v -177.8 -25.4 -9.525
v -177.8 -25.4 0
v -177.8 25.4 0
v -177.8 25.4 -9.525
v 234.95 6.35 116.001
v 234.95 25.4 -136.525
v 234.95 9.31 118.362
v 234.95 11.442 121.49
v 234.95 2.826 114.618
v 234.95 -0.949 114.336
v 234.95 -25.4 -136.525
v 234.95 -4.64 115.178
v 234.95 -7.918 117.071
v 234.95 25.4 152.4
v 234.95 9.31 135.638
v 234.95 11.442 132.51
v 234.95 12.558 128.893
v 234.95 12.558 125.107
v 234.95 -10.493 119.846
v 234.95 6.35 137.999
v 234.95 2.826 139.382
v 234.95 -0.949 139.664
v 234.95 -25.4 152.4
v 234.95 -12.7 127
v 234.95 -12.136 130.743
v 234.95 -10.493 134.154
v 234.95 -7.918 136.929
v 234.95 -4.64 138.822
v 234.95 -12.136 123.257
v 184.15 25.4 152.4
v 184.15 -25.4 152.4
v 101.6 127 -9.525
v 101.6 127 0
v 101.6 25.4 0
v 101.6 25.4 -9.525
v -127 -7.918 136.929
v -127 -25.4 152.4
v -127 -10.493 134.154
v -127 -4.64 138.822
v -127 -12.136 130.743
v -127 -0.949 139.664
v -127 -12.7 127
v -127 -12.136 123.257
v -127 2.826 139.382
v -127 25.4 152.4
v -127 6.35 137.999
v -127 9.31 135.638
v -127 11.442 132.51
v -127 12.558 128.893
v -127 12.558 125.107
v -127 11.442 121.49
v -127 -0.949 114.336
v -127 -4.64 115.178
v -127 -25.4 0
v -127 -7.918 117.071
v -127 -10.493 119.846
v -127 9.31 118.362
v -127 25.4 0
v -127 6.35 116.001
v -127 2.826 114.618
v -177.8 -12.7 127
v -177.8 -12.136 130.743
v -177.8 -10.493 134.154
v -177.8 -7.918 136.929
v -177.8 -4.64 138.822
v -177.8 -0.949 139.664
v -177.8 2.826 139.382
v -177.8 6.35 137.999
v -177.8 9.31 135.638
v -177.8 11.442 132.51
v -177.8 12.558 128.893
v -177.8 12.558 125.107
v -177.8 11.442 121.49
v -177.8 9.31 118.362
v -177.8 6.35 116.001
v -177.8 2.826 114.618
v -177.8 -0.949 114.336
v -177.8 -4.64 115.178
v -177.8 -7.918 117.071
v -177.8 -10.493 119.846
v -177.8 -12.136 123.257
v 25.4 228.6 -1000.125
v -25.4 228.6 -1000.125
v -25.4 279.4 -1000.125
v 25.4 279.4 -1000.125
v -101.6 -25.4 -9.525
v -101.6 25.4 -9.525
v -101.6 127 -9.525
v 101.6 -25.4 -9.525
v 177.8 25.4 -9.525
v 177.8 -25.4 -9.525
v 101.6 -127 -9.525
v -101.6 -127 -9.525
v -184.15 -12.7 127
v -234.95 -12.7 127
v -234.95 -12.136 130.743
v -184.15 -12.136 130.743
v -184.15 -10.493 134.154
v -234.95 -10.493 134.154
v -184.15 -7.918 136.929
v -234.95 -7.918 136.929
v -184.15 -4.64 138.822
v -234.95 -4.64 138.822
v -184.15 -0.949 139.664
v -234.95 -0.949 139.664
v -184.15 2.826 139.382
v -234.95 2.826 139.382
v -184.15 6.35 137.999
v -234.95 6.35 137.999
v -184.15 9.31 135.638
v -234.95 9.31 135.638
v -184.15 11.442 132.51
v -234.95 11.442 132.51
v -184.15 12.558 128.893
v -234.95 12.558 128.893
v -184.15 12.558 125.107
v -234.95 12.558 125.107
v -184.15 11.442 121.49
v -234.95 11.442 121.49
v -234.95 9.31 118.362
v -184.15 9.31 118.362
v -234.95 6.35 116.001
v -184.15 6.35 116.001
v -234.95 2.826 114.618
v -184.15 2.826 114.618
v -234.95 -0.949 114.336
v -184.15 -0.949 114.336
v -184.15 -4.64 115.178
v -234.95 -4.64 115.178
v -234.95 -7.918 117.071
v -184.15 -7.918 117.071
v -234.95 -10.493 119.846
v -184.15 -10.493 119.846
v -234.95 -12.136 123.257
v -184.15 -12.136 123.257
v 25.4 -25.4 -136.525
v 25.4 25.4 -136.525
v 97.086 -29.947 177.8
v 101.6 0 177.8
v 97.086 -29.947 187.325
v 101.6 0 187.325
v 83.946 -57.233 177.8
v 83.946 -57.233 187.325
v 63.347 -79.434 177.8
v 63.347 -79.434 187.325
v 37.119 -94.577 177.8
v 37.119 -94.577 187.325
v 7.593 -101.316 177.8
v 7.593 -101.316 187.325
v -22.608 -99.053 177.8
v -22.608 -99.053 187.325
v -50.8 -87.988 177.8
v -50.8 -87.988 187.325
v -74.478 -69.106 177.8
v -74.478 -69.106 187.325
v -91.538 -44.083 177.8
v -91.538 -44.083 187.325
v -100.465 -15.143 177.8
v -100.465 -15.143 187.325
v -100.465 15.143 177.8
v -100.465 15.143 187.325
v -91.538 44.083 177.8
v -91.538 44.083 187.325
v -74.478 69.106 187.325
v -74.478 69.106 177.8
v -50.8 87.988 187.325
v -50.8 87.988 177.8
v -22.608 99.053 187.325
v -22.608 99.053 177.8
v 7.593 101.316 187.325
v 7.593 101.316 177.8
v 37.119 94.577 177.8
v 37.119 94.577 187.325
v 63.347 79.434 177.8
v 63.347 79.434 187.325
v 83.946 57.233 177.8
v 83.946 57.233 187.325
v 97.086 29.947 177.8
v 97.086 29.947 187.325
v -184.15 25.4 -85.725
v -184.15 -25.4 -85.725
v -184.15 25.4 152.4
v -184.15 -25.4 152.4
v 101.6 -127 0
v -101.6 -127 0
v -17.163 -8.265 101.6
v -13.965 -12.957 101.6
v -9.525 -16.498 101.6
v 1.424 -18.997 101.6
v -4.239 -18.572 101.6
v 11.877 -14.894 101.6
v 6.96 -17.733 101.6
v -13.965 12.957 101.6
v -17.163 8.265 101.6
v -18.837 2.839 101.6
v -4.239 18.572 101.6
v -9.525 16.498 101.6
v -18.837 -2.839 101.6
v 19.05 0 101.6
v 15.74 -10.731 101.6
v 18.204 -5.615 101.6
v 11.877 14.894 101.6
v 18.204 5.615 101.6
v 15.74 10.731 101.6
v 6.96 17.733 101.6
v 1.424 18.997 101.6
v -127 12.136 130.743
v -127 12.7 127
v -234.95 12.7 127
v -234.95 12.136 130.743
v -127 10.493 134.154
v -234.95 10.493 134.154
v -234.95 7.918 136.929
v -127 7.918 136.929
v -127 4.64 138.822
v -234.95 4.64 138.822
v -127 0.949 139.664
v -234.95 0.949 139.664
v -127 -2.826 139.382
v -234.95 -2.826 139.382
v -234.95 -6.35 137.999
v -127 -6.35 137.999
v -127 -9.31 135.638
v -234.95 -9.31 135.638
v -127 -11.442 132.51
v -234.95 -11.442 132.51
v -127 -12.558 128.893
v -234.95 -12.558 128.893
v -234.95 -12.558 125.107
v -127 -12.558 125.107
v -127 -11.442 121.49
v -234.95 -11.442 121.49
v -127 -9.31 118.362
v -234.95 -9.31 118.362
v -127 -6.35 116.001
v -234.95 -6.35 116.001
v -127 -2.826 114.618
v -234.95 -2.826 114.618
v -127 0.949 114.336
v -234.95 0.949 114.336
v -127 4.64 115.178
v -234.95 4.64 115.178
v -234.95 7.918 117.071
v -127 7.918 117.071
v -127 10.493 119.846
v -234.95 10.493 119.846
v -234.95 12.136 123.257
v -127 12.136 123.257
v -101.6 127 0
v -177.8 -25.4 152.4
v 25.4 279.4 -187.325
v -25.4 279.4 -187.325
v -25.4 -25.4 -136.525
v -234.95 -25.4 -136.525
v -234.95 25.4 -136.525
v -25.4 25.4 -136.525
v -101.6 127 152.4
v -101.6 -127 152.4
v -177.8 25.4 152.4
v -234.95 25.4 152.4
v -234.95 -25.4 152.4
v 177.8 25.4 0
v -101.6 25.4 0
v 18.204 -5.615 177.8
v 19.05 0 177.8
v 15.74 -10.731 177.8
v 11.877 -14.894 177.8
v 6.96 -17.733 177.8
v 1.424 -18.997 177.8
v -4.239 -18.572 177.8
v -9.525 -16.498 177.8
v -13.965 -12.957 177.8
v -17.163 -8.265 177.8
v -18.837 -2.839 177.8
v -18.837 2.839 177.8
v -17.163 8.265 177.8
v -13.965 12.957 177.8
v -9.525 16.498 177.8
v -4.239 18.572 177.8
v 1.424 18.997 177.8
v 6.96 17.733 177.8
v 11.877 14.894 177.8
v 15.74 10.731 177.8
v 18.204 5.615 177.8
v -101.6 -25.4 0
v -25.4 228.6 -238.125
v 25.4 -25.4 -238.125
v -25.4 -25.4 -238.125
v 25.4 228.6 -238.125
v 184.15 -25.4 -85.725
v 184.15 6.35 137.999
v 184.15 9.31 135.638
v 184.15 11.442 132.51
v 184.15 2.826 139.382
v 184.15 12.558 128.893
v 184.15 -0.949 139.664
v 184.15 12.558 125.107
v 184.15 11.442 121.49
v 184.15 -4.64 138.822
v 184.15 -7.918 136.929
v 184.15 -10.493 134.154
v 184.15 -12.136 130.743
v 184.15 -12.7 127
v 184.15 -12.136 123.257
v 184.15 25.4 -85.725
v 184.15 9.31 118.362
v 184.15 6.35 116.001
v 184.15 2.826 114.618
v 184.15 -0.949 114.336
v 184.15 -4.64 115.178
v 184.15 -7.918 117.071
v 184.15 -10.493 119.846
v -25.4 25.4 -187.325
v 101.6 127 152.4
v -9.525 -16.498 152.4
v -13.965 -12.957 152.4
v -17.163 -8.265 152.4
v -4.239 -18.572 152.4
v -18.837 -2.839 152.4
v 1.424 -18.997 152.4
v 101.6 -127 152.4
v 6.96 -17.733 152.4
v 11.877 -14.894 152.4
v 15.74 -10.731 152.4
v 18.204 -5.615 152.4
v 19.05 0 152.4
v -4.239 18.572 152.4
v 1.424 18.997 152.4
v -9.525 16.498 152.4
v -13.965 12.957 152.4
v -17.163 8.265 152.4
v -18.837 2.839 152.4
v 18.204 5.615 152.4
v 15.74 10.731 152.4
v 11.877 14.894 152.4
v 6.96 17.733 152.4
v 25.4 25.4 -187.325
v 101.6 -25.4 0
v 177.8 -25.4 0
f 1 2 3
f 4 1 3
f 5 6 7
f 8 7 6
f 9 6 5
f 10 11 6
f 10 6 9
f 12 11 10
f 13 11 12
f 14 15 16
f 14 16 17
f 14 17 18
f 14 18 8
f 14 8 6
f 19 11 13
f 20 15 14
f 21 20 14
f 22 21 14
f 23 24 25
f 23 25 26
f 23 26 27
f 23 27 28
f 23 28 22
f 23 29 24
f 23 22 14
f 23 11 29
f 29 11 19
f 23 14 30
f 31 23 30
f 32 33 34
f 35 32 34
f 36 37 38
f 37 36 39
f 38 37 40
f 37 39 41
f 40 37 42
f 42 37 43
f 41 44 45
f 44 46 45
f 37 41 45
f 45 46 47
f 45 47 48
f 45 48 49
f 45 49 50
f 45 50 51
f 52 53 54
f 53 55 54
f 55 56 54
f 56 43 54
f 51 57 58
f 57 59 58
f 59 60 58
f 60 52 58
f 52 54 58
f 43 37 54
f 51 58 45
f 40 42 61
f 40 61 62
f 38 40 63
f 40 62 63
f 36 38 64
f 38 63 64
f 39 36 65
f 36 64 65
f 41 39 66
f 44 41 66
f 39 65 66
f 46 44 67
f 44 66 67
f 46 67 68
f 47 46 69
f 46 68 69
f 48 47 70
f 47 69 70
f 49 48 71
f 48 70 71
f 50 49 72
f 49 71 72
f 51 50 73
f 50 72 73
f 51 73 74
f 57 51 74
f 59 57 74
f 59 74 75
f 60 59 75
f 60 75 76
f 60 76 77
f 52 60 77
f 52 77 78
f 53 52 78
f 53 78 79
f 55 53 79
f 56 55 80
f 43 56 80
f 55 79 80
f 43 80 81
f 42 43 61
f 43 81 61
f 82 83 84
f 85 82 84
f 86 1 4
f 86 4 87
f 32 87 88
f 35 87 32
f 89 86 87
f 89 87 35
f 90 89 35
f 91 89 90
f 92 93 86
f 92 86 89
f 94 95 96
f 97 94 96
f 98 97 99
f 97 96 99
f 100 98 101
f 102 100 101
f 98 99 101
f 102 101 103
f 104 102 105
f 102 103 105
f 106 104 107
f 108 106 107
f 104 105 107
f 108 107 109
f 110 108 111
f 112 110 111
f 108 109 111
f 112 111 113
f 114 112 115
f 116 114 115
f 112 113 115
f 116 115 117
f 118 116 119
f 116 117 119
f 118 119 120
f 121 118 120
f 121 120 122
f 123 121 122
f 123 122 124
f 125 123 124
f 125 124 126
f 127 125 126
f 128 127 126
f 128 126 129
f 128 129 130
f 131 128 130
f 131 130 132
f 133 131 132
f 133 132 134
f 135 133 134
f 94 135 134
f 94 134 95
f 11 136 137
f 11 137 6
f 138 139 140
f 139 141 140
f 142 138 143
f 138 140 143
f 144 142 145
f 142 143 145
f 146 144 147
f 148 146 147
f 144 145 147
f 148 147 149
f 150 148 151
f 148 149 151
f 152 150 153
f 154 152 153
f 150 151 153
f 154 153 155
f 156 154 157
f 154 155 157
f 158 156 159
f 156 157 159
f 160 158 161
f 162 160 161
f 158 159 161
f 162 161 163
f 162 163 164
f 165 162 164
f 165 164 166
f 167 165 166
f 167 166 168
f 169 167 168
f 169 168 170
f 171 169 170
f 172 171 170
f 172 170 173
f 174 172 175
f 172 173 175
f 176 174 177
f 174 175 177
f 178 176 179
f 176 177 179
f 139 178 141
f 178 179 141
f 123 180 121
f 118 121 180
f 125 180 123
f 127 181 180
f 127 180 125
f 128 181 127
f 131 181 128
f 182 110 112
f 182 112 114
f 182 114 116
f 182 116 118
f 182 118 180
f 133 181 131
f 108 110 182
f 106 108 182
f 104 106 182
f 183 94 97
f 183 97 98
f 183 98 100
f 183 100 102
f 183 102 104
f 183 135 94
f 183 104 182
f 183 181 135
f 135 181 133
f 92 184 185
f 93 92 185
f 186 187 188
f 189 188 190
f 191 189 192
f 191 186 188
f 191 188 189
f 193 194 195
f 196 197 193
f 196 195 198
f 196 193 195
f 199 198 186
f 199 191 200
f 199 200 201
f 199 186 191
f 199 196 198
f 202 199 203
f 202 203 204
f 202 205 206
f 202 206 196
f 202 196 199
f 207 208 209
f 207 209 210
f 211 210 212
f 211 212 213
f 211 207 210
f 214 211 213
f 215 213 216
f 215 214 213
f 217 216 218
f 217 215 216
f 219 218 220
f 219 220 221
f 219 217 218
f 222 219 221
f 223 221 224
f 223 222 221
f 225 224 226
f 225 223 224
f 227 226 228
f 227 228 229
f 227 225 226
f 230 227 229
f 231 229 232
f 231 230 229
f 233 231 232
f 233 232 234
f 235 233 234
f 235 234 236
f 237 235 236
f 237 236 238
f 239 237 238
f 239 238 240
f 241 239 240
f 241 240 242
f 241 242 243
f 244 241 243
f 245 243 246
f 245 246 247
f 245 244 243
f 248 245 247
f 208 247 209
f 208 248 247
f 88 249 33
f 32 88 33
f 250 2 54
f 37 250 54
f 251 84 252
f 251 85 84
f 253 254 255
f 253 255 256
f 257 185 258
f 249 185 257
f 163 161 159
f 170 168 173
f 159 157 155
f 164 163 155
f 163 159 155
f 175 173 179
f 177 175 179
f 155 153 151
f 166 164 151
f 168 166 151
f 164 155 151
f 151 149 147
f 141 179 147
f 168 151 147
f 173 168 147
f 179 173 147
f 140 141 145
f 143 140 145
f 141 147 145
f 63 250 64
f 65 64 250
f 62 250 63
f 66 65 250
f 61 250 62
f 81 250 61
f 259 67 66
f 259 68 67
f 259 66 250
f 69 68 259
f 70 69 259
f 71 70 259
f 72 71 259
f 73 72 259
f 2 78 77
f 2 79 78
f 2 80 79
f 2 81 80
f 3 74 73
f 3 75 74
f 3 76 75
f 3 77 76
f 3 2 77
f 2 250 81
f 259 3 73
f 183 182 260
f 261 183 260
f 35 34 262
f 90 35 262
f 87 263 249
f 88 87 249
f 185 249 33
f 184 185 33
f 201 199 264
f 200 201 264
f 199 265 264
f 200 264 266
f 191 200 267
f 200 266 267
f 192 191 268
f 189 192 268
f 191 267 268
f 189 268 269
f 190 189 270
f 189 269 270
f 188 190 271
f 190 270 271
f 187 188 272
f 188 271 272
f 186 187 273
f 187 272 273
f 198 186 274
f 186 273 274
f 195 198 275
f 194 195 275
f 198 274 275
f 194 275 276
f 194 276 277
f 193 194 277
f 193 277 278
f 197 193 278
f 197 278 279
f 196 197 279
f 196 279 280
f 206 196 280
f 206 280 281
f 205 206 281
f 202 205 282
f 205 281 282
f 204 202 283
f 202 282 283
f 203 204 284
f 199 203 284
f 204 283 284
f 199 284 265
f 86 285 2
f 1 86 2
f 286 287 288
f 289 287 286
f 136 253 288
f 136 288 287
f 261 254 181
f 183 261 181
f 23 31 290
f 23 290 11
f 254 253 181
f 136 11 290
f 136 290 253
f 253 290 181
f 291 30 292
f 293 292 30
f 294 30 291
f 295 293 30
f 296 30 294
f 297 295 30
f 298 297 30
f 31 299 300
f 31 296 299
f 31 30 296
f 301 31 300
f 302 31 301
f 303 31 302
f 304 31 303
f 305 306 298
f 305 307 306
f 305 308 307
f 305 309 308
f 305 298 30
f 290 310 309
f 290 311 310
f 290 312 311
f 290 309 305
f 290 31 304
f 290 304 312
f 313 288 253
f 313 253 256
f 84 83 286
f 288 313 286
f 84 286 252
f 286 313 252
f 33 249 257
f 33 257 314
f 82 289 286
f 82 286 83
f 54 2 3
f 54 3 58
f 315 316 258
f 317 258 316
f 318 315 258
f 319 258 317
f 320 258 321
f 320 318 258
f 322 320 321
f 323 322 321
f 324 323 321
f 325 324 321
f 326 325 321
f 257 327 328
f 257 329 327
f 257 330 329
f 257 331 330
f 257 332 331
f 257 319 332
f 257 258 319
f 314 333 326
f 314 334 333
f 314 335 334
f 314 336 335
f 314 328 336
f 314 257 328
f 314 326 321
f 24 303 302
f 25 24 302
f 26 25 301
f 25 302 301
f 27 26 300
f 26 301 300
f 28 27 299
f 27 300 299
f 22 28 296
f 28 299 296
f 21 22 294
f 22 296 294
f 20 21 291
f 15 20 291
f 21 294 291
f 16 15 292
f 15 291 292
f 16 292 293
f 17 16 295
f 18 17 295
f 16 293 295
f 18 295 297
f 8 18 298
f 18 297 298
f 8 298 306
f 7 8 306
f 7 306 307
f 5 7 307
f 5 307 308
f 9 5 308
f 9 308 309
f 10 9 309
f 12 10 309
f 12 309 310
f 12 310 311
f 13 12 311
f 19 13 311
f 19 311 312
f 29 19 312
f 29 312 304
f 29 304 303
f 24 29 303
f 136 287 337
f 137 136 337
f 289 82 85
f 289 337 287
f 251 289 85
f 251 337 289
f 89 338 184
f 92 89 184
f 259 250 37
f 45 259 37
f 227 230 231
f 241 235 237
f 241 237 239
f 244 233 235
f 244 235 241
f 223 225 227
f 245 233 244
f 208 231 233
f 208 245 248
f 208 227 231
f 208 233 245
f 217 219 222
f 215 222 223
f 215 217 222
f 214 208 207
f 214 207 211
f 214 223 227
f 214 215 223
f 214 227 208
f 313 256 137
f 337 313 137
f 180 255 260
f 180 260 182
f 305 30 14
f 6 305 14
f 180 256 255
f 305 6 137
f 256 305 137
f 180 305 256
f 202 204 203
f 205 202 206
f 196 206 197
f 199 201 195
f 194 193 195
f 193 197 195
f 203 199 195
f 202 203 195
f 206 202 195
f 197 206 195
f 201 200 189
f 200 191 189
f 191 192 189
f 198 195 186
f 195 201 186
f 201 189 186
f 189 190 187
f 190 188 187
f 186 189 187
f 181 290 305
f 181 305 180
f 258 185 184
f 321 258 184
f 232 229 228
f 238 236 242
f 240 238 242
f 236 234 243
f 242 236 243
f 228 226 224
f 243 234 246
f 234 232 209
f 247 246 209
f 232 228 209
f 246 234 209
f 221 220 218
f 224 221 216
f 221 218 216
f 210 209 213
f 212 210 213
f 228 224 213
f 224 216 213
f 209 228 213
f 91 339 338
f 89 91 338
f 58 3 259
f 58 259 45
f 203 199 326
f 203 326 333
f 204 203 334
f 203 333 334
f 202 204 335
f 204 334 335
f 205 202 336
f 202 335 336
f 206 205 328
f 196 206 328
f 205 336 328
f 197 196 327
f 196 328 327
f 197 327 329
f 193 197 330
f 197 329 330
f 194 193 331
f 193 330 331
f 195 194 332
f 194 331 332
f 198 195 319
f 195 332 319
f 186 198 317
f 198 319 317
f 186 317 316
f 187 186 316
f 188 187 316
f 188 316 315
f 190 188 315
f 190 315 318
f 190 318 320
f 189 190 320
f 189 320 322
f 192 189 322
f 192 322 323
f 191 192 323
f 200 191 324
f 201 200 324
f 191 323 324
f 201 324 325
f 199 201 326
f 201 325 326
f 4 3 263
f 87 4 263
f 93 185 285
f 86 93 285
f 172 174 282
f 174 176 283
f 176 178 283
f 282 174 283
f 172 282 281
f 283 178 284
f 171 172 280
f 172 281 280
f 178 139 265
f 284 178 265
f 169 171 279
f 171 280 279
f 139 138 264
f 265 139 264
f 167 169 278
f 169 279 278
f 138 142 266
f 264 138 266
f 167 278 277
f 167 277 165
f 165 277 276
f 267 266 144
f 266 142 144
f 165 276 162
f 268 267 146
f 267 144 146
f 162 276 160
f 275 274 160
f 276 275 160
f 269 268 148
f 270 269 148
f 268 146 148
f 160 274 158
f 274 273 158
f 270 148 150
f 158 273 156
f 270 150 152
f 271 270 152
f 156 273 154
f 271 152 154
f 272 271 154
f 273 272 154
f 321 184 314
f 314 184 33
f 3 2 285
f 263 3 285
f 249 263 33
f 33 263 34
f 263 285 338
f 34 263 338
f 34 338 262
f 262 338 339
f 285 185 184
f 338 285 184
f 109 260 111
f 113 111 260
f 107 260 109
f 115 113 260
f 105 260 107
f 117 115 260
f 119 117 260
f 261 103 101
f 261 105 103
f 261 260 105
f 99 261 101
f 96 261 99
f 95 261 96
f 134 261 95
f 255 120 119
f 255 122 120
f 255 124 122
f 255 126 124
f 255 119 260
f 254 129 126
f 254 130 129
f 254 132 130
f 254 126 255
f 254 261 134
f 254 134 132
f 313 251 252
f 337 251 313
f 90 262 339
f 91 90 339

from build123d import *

# Parameters (mm, degrees)
F0_W      = 203.2
F0_H      = 254
F1_DEPTH  = 152.4
F2_R      = 19.05
F3_DEPTH  = 50.8
F7_DEPTH  = 9.525
F8_W      = 50.8
F8_H      = 50.8
F9_DEPTH  = 152.4
F10_R     = 12.7
F11_DEPTH = 50.8
F12_R     = 12.7
F13_DEPTH = 107.95
F15_DEPTH = 50.8
F16_R     = 12.7
F17_DEPTH = 469.9
F19_DEPTH = 25.4


with BuildPart() as f1:
    # F0 (on Top) → F1 (new body)
    with BuildSketch(Plane.XY):
        Rectangle(F0_W, F0_H)
    extrude(amount=F1_DEPTH)

    # F2 (on face) → F3 (cut)
    with BuildSketch(Plane.XY.offset(152.4)):
        Circle(F2_R)
    extrude(amount=-F3_DEPTH, mode=Mode.SUBTRACT)


with BuildPart() as f5:
    # F4 (on Front) → F5 (revolve)
    with BuildSketch(Plane.XZ):
        Polygon((101.6, 187.325), (0, 187.325), (0, 101.6), (19.05, 101.6), (19.05, 177.8), (101.6, 177.8), align=None)
    revolve(axis=Axis((0, 0, 144.4625), (0, 0, -1)))


with BuildPart() as f7:
    # F6 (on face) → F7 (new body)
    with BuildSketch(Plane(origin=(0, 0, 0), x_dir=(1, 0, 0), z_dir=(0, 0, -1))):
        Polygon((101.6, 127), (-101.6, 127), (-101.6, 25.4), (-177.8, 25.4), (-177.8, -25.4), (-101.6, -25.4), (-101.6, -127), (101.6, -127), (101.6, -25.4), (177.8, -25.4), (177.8, 25.4), (101.6, 25.4), align=None)
    extrude(amount=F7_DEPTH)


with BuildPart() as f9:
    # F8 (on face) → F9 (new body, through all)
    with BuildSketch(Plane.XY):
        with Locations((-152.4, 0)):
            Rectangle(F8_W, F8_H)
    extrude(amount=F9_DEPTH)

    # F10 (on face) → F11 (cut, through all)
    with BuildSketch(Plane(origin=(-177.8, 0, 0), x_dir=(0, -1, 0), z_dir=(-1, 0, 0))):
        with Locations((0, 127)):
            Circle(F10_R)
    extrude(amount=-F11_DEPTH, mode=Mode.SUBTRACT)


with BuildPart() as f13:
    # F12 (on face) → F13 (new body)
    with BuildSketch(Plane.YZ.offset(-127)):
        with Locations((0, 127)):
            Circle(F12_R)
    extrude(amount=-F13_DEPTH)


with BuildPart() as f15:
    # F14 (on face) → F15 (new body, through all)
    with BuildSketch(Plane.XZ.offset(25.4)):
        Polygon((-184.15, -85.725), (-184.15, 152.4), (-234.95, 152.4), (-234.95, -136.525), (234.95, -136.525), (234.95, 152.4), (184.15, 152.4), (184.15, -85.725), align=None)
    extrude(amount=-F15_DEPTH)

    # F16 (on face) → F17 (cut, through all)
    with BuildSketch(Plane(origin=(-234.95, 0, 0), x_dir=(0, -1, 0), z_dir=(-1, 0, 0))):
        with Locations((0, 127)):
            Circle(F16_R)
    extrude(amount=-F17_DEPTH, mode=Mode.SUBTRACT)

    # F18 (on Right) → F19 (join, symmetric)
    with BuildSketch(Plane.YZ):
        Polygon((25.4, -187.325), (25.4, -136.525), (-25.4, -136.525), (-25.4, -238.125), (228.6, -238.125), (228.6, -1000.125), (279.4, -1000.125), (279.4, -187.325), align=None)
    extrude(amount=F19_DEPTH, both=True)


solid = Compound([f1.part, f5.part, f7.part, f9.part, f13.part, f15.part])
